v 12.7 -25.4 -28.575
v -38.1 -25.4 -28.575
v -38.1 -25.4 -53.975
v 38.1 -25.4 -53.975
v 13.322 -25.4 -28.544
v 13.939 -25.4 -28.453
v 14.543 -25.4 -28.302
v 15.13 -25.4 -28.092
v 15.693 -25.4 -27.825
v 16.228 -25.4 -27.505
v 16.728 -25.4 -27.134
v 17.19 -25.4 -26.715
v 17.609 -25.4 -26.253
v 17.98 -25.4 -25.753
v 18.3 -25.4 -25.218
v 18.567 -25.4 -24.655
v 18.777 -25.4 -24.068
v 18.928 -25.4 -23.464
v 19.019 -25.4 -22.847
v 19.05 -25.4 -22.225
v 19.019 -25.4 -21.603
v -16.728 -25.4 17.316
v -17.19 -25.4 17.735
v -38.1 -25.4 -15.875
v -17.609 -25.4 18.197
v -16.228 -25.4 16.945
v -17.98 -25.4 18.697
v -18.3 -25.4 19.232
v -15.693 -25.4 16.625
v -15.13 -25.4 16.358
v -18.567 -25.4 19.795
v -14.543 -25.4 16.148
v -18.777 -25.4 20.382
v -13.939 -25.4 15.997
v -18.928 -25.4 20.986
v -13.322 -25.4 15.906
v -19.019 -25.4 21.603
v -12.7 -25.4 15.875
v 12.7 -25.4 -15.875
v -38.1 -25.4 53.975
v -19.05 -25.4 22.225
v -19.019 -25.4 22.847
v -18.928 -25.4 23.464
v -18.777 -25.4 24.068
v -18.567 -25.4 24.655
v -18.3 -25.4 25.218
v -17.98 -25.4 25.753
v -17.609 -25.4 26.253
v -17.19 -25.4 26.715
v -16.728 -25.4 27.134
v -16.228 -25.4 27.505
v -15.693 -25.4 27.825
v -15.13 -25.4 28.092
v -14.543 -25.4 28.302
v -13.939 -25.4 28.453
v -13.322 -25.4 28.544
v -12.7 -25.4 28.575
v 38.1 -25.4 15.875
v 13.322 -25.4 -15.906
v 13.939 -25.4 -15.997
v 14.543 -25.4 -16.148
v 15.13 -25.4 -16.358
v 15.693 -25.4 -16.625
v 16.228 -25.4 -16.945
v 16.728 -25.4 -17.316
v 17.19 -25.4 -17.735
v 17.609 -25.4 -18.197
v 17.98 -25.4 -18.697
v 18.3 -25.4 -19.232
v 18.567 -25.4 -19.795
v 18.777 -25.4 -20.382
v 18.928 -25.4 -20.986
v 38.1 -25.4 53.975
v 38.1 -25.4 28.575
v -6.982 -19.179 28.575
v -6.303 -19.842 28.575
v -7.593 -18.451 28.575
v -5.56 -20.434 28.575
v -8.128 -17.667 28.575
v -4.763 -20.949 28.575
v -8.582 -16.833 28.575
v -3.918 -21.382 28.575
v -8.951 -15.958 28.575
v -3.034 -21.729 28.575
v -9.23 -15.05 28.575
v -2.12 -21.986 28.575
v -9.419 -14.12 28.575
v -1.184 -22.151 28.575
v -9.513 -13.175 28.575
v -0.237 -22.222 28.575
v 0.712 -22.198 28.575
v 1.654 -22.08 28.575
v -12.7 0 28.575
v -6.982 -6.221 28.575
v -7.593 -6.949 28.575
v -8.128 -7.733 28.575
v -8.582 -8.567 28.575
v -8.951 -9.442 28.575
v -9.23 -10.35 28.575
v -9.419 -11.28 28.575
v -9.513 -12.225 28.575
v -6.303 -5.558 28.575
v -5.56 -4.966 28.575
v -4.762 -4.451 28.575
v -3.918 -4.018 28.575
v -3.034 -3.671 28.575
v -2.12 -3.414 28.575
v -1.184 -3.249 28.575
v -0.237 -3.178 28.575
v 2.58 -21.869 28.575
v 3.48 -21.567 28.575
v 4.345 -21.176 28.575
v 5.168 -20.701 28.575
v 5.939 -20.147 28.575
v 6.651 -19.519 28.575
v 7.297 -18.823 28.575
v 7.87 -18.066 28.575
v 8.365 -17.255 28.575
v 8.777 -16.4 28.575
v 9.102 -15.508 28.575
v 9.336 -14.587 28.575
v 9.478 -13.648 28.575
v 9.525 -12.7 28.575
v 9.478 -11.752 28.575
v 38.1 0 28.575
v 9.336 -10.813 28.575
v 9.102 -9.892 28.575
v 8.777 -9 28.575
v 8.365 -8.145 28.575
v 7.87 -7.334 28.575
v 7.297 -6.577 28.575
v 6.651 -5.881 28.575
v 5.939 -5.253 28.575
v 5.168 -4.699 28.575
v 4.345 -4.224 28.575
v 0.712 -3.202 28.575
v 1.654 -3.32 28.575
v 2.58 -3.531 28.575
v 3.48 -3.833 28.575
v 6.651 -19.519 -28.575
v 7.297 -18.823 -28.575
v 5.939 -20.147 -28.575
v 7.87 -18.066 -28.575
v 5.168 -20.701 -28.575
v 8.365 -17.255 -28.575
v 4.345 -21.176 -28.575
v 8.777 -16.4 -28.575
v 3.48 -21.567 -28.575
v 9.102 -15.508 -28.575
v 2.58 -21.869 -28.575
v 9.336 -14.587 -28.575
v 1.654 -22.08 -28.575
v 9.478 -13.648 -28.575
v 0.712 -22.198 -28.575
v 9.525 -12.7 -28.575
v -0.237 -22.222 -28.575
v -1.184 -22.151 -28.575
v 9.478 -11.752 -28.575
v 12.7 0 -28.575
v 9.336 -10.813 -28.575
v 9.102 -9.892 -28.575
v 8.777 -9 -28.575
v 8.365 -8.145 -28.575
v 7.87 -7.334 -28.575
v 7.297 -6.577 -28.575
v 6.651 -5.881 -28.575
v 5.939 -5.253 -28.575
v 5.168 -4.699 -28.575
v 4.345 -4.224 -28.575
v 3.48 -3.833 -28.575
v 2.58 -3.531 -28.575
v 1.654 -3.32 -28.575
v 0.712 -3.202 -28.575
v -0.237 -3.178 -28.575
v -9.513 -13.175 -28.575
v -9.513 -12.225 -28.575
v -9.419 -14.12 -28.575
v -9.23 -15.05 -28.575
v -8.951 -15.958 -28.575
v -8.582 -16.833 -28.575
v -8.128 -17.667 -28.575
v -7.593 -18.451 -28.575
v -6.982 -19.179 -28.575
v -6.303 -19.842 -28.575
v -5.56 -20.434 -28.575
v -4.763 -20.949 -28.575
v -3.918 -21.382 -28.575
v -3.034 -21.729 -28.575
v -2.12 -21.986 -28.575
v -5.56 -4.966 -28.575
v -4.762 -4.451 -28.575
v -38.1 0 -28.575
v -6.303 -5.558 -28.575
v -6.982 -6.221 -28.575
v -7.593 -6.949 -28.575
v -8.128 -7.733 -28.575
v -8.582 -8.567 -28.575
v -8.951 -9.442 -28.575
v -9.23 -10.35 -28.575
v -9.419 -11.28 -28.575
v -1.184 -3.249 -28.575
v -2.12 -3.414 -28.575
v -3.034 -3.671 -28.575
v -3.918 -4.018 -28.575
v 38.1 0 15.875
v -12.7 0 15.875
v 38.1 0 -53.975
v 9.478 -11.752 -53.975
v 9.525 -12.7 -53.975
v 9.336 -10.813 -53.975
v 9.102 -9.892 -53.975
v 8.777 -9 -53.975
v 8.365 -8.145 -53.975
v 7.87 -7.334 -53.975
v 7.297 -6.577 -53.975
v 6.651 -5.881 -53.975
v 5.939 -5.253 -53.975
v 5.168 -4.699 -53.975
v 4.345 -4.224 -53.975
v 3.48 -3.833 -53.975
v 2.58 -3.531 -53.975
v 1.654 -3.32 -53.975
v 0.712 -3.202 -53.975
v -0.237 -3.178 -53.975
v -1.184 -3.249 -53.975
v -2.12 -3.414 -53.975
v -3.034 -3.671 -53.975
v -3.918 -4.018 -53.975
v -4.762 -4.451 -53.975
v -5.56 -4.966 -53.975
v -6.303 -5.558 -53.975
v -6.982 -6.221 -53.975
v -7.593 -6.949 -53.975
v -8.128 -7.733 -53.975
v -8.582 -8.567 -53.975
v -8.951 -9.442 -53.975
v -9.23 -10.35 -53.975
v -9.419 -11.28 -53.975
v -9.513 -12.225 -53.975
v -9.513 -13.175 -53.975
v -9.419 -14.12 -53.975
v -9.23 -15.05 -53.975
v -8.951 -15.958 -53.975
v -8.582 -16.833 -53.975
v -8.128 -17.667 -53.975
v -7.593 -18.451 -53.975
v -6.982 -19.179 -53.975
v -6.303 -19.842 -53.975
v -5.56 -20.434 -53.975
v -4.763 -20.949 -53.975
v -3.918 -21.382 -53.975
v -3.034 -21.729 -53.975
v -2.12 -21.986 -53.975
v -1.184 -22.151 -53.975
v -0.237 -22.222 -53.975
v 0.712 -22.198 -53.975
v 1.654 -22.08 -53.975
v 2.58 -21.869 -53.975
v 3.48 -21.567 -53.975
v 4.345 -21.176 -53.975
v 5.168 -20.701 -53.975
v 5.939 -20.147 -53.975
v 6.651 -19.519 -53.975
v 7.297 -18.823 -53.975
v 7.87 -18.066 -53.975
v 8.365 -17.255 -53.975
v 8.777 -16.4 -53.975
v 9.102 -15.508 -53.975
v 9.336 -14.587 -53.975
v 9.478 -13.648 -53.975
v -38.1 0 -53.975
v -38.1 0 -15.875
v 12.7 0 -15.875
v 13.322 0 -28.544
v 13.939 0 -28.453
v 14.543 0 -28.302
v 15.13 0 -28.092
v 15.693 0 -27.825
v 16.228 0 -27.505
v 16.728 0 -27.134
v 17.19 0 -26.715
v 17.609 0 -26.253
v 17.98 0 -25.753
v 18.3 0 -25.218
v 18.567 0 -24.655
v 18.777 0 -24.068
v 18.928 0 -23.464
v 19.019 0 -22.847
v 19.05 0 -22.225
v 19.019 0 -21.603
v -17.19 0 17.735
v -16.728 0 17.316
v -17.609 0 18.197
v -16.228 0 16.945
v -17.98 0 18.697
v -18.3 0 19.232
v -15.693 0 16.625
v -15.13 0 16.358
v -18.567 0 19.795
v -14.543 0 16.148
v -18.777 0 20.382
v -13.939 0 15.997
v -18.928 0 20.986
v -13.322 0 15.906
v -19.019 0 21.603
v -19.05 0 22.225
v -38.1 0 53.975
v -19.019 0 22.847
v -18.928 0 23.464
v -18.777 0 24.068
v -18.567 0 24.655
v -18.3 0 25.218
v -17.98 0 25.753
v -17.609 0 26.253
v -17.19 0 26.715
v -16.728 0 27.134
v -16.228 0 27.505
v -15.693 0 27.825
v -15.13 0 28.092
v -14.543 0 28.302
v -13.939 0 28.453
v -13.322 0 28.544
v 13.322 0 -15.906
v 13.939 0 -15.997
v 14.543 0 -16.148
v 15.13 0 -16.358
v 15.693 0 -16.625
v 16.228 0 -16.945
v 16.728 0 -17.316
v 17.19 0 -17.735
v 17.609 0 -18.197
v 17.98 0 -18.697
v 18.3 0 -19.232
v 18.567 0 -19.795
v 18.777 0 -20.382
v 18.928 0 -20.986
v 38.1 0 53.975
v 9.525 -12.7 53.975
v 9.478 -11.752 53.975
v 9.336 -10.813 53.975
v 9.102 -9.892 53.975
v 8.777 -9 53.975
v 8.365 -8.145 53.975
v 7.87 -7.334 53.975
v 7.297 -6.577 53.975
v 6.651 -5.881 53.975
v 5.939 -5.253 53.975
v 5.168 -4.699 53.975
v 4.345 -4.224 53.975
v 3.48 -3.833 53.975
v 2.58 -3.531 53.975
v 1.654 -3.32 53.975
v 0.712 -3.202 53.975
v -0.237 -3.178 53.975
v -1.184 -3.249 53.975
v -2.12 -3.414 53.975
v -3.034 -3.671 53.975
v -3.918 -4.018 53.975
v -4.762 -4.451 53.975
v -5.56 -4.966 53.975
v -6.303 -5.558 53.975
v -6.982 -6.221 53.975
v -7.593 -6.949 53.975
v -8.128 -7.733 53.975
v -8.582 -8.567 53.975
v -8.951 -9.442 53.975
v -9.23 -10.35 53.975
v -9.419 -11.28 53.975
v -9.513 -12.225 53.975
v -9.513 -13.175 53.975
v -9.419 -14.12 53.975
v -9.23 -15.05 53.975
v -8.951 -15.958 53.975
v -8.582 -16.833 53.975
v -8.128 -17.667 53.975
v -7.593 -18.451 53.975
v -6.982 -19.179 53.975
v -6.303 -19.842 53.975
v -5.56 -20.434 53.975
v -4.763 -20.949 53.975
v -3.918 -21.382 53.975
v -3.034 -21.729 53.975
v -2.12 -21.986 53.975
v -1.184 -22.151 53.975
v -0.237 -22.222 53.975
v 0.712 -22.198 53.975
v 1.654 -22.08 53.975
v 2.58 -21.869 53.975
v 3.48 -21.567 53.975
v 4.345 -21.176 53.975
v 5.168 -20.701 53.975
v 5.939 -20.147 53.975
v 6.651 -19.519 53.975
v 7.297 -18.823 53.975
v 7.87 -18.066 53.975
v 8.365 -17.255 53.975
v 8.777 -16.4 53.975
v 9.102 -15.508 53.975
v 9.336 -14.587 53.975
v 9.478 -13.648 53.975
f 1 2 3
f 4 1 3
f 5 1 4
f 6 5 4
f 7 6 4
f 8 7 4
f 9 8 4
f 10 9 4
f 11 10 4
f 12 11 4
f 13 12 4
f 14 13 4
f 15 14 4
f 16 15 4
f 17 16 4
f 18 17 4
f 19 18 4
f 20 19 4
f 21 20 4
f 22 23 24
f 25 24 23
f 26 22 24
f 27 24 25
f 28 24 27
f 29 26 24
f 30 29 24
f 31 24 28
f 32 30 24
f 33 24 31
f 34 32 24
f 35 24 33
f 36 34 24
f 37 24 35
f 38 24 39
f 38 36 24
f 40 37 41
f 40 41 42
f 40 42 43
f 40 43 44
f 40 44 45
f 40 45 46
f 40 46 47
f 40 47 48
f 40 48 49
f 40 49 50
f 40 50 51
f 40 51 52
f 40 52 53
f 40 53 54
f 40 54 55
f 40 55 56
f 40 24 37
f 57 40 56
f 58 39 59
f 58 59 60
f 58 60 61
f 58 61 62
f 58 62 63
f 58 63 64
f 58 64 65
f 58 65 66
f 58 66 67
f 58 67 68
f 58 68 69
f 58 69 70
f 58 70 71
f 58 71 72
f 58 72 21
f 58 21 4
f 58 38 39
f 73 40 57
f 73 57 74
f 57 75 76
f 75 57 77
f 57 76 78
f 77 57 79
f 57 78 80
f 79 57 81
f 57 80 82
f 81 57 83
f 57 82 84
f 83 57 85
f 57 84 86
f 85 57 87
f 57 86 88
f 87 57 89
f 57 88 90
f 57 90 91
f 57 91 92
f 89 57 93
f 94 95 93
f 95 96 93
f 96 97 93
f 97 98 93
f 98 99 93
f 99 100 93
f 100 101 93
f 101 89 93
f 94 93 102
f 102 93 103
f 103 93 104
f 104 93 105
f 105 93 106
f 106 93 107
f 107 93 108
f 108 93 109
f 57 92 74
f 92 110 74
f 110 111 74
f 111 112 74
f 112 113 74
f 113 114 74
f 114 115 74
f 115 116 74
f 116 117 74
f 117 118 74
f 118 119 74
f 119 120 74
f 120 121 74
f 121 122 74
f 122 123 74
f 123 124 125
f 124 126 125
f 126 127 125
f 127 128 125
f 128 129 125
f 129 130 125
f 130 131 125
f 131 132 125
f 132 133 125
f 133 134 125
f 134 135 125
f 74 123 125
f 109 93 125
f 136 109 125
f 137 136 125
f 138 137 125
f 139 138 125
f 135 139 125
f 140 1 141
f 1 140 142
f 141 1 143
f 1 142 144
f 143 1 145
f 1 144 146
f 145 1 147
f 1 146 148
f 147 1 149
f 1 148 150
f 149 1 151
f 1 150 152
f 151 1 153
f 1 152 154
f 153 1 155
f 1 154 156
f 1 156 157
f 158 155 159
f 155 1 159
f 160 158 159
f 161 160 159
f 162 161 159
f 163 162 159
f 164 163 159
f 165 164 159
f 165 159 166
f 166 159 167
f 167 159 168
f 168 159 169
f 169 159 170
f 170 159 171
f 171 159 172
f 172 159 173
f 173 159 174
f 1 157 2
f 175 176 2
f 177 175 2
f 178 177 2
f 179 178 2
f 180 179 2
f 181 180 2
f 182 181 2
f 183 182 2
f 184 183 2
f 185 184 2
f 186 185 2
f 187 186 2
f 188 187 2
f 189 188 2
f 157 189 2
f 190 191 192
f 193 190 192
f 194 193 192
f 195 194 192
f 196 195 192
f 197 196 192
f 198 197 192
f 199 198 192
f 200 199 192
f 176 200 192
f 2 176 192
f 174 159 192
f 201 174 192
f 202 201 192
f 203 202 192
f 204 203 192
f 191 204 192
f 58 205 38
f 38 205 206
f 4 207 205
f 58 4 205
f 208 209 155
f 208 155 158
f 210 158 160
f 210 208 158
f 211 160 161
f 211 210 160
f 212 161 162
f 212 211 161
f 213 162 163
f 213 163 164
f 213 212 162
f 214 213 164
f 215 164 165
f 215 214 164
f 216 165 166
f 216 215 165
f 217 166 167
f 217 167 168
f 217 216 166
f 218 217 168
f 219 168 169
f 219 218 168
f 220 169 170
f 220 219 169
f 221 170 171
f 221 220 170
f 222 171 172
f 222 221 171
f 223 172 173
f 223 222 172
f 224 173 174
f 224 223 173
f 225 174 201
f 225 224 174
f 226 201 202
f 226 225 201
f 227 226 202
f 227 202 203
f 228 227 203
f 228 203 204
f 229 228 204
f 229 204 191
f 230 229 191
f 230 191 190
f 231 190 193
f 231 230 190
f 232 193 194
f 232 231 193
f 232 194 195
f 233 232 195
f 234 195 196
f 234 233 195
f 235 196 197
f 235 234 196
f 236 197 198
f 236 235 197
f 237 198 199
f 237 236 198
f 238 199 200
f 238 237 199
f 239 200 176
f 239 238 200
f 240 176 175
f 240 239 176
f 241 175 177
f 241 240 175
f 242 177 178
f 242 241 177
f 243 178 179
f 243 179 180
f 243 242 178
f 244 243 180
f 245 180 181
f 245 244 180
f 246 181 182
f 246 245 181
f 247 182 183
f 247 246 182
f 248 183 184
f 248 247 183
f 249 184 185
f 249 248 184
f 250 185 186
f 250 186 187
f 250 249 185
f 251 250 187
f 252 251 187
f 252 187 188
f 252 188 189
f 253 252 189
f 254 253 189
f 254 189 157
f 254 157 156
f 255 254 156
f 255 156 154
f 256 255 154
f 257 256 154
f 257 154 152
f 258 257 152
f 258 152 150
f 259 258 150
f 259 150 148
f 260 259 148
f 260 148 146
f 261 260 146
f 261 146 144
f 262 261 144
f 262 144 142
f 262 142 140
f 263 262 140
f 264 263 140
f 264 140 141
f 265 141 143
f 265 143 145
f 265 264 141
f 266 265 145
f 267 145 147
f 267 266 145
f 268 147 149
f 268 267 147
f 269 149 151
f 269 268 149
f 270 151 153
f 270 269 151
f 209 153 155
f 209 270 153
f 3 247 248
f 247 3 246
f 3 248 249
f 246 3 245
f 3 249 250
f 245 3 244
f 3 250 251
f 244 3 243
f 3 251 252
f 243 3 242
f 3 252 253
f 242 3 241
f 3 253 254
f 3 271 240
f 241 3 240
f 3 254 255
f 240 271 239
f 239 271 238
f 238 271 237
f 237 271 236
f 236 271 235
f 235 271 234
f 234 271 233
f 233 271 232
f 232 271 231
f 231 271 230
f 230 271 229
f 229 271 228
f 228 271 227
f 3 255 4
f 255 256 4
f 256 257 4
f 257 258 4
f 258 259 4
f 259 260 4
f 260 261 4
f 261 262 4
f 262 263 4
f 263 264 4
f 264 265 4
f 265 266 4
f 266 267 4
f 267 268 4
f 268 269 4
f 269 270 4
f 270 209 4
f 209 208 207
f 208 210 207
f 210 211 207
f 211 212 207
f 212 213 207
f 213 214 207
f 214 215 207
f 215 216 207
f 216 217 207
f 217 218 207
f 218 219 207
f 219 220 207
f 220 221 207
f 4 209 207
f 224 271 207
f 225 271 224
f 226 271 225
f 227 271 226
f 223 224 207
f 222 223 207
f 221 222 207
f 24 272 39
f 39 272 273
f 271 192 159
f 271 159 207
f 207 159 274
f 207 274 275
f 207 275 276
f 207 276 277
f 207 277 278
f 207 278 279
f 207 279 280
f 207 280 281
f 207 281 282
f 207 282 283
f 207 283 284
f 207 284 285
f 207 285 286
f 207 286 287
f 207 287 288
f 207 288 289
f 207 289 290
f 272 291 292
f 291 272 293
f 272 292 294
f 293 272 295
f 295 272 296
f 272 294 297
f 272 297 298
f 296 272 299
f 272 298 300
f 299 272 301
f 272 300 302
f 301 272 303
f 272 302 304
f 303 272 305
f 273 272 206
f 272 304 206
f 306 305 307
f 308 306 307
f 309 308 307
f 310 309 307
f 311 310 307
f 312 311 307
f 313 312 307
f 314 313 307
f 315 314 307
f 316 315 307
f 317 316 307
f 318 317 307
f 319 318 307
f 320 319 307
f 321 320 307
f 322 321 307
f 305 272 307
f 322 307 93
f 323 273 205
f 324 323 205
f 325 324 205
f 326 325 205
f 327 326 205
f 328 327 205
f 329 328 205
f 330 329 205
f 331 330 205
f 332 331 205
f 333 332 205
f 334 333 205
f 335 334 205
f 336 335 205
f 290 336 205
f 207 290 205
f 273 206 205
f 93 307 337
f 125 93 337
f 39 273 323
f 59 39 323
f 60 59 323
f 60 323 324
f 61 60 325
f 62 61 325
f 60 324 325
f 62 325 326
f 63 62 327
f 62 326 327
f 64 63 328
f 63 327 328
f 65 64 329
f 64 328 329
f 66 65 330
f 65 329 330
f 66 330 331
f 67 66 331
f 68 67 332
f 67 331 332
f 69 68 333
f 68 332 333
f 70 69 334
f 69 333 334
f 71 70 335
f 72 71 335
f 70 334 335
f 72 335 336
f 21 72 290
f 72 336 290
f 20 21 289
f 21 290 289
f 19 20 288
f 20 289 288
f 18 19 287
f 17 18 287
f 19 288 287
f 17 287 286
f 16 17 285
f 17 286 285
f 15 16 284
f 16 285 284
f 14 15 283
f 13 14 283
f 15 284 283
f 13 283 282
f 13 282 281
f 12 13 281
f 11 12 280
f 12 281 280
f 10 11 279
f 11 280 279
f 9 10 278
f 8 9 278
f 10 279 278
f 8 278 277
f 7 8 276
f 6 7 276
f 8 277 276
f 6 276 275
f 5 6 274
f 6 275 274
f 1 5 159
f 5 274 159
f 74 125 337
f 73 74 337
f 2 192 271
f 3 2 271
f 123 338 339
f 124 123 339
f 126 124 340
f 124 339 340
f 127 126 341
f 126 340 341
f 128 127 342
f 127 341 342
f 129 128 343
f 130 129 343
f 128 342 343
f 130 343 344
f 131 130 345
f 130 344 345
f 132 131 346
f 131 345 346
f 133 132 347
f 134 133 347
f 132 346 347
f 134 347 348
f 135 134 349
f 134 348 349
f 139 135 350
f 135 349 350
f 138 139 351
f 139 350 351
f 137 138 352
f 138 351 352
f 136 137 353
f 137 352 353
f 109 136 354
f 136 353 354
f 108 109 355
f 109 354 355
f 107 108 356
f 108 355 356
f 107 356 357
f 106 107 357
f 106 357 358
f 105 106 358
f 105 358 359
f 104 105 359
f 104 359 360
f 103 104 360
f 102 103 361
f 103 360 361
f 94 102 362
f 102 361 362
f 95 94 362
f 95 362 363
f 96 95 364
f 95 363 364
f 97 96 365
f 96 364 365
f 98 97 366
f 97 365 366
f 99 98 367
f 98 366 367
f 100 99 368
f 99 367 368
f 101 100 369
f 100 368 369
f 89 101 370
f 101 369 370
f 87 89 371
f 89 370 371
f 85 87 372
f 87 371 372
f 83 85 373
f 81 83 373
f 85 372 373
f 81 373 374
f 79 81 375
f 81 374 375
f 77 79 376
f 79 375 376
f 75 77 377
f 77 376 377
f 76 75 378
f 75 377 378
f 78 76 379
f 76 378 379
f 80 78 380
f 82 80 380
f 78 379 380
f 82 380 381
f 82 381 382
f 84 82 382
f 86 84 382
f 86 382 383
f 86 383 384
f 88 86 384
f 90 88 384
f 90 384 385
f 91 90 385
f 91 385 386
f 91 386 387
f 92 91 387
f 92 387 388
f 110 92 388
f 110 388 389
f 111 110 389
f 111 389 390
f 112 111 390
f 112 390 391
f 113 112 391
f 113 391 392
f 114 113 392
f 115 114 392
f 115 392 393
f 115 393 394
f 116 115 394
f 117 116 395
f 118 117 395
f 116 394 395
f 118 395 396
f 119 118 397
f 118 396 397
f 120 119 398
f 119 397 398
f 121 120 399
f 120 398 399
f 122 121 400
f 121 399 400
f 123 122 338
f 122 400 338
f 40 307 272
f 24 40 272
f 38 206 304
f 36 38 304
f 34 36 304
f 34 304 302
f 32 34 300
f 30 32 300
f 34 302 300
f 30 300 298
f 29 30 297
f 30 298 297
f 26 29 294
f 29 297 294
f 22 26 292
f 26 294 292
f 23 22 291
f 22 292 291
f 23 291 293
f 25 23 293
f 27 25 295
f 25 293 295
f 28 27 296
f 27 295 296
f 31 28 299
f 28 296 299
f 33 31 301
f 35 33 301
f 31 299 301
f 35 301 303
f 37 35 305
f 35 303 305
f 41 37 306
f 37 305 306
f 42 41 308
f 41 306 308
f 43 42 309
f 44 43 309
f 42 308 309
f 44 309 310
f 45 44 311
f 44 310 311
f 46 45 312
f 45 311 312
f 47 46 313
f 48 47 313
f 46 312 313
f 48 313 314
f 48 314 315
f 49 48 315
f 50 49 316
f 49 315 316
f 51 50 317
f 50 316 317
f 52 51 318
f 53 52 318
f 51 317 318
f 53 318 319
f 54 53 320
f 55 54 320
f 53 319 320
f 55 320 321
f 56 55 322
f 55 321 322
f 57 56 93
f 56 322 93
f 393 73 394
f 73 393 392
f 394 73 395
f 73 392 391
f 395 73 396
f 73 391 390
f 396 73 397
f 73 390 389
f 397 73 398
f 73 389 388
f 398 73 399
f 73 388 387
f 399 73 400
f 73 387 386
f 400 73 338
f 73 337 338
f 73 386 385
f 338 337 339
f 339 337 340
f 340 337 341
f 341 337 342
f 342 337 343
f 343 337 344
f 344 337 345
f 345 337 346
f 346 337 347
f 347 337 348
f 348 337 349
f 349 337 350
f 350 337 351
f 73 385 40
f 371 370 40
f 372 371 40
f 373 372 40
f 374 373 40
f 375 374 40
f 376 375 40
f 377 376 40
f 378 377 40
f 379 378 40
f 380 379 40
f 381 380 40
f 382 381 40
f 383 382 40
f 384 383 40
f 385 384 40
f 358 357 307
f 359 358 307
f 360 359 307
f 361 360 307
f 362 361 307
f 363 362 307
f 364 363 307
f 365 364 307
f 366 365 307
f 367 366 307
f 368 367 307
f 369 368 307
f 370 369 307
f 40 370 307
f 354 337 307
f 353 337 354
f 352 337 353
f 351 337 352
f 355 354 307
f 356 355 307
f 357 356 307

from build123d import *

# Parameters (mm, degrees)
F1_DEPTH = 25.4
F2_R     = 9.525
F3_DEPTH = 25.4


# Not quite as in the source:
# - a pattern or mirror of a feature is missing from the dataset's text; its kind, count and spacing are read off the source's solid


with BuildPart() as f1:
    # F0 (on Front) → F1 (new body)
    with BuildSketch(Plane.XZ):
        with BuildLine():
            Line((38.1, 53.975), (-38.1, 53.975))
            Line((-38.1, 53.975), (-38.1, -15.875))
            Line((-38.1, -15.875), (12.7, -15.875))
            ThreePointArc((12.7, -15.875), (19.05, -22.225), (12.7, -28.575))
            Line((12.7, -28.575), (-38.1, -28.575))
            Line((-38.1, -28.575), (-38.1, -53.975))
            Line((-38.1, -53.975), (38.1, -53.975))
            Line((38.1, -53.975), (38.1, 15.875))
            Line((38.1, 15.875), (-12.7, 15.875))
            ThreePointArc((-12.7, 15.875), (-19.05, 22.225), (-12.7, 28.575))
            Line((-12.7, 28.575), (38.1, 28.575))
            Line((38.1, 28.575), (38.1, 53.975))
        make_face()
    extrude(amount=F1_DEPTH)

    # F2 (on face) → F3 (cut, through all)
    with BuildSketch(Plane.XY.offset(53.975)):
        with Locations((0, -12.7)):
            Circle(F2_R)
    f3 = extrude(amount=-F3_DEPTH, mode=Mode.SUBTRACT)

    # F3_copies: F3 across plane
    add(f3.mirror(Plane(origin=(0, 0, 0), x_dir=(-1, 0, 0), z_dir=(0, 0, -1))), mode=Mode.SUBTRACT)


solid = f1.part
